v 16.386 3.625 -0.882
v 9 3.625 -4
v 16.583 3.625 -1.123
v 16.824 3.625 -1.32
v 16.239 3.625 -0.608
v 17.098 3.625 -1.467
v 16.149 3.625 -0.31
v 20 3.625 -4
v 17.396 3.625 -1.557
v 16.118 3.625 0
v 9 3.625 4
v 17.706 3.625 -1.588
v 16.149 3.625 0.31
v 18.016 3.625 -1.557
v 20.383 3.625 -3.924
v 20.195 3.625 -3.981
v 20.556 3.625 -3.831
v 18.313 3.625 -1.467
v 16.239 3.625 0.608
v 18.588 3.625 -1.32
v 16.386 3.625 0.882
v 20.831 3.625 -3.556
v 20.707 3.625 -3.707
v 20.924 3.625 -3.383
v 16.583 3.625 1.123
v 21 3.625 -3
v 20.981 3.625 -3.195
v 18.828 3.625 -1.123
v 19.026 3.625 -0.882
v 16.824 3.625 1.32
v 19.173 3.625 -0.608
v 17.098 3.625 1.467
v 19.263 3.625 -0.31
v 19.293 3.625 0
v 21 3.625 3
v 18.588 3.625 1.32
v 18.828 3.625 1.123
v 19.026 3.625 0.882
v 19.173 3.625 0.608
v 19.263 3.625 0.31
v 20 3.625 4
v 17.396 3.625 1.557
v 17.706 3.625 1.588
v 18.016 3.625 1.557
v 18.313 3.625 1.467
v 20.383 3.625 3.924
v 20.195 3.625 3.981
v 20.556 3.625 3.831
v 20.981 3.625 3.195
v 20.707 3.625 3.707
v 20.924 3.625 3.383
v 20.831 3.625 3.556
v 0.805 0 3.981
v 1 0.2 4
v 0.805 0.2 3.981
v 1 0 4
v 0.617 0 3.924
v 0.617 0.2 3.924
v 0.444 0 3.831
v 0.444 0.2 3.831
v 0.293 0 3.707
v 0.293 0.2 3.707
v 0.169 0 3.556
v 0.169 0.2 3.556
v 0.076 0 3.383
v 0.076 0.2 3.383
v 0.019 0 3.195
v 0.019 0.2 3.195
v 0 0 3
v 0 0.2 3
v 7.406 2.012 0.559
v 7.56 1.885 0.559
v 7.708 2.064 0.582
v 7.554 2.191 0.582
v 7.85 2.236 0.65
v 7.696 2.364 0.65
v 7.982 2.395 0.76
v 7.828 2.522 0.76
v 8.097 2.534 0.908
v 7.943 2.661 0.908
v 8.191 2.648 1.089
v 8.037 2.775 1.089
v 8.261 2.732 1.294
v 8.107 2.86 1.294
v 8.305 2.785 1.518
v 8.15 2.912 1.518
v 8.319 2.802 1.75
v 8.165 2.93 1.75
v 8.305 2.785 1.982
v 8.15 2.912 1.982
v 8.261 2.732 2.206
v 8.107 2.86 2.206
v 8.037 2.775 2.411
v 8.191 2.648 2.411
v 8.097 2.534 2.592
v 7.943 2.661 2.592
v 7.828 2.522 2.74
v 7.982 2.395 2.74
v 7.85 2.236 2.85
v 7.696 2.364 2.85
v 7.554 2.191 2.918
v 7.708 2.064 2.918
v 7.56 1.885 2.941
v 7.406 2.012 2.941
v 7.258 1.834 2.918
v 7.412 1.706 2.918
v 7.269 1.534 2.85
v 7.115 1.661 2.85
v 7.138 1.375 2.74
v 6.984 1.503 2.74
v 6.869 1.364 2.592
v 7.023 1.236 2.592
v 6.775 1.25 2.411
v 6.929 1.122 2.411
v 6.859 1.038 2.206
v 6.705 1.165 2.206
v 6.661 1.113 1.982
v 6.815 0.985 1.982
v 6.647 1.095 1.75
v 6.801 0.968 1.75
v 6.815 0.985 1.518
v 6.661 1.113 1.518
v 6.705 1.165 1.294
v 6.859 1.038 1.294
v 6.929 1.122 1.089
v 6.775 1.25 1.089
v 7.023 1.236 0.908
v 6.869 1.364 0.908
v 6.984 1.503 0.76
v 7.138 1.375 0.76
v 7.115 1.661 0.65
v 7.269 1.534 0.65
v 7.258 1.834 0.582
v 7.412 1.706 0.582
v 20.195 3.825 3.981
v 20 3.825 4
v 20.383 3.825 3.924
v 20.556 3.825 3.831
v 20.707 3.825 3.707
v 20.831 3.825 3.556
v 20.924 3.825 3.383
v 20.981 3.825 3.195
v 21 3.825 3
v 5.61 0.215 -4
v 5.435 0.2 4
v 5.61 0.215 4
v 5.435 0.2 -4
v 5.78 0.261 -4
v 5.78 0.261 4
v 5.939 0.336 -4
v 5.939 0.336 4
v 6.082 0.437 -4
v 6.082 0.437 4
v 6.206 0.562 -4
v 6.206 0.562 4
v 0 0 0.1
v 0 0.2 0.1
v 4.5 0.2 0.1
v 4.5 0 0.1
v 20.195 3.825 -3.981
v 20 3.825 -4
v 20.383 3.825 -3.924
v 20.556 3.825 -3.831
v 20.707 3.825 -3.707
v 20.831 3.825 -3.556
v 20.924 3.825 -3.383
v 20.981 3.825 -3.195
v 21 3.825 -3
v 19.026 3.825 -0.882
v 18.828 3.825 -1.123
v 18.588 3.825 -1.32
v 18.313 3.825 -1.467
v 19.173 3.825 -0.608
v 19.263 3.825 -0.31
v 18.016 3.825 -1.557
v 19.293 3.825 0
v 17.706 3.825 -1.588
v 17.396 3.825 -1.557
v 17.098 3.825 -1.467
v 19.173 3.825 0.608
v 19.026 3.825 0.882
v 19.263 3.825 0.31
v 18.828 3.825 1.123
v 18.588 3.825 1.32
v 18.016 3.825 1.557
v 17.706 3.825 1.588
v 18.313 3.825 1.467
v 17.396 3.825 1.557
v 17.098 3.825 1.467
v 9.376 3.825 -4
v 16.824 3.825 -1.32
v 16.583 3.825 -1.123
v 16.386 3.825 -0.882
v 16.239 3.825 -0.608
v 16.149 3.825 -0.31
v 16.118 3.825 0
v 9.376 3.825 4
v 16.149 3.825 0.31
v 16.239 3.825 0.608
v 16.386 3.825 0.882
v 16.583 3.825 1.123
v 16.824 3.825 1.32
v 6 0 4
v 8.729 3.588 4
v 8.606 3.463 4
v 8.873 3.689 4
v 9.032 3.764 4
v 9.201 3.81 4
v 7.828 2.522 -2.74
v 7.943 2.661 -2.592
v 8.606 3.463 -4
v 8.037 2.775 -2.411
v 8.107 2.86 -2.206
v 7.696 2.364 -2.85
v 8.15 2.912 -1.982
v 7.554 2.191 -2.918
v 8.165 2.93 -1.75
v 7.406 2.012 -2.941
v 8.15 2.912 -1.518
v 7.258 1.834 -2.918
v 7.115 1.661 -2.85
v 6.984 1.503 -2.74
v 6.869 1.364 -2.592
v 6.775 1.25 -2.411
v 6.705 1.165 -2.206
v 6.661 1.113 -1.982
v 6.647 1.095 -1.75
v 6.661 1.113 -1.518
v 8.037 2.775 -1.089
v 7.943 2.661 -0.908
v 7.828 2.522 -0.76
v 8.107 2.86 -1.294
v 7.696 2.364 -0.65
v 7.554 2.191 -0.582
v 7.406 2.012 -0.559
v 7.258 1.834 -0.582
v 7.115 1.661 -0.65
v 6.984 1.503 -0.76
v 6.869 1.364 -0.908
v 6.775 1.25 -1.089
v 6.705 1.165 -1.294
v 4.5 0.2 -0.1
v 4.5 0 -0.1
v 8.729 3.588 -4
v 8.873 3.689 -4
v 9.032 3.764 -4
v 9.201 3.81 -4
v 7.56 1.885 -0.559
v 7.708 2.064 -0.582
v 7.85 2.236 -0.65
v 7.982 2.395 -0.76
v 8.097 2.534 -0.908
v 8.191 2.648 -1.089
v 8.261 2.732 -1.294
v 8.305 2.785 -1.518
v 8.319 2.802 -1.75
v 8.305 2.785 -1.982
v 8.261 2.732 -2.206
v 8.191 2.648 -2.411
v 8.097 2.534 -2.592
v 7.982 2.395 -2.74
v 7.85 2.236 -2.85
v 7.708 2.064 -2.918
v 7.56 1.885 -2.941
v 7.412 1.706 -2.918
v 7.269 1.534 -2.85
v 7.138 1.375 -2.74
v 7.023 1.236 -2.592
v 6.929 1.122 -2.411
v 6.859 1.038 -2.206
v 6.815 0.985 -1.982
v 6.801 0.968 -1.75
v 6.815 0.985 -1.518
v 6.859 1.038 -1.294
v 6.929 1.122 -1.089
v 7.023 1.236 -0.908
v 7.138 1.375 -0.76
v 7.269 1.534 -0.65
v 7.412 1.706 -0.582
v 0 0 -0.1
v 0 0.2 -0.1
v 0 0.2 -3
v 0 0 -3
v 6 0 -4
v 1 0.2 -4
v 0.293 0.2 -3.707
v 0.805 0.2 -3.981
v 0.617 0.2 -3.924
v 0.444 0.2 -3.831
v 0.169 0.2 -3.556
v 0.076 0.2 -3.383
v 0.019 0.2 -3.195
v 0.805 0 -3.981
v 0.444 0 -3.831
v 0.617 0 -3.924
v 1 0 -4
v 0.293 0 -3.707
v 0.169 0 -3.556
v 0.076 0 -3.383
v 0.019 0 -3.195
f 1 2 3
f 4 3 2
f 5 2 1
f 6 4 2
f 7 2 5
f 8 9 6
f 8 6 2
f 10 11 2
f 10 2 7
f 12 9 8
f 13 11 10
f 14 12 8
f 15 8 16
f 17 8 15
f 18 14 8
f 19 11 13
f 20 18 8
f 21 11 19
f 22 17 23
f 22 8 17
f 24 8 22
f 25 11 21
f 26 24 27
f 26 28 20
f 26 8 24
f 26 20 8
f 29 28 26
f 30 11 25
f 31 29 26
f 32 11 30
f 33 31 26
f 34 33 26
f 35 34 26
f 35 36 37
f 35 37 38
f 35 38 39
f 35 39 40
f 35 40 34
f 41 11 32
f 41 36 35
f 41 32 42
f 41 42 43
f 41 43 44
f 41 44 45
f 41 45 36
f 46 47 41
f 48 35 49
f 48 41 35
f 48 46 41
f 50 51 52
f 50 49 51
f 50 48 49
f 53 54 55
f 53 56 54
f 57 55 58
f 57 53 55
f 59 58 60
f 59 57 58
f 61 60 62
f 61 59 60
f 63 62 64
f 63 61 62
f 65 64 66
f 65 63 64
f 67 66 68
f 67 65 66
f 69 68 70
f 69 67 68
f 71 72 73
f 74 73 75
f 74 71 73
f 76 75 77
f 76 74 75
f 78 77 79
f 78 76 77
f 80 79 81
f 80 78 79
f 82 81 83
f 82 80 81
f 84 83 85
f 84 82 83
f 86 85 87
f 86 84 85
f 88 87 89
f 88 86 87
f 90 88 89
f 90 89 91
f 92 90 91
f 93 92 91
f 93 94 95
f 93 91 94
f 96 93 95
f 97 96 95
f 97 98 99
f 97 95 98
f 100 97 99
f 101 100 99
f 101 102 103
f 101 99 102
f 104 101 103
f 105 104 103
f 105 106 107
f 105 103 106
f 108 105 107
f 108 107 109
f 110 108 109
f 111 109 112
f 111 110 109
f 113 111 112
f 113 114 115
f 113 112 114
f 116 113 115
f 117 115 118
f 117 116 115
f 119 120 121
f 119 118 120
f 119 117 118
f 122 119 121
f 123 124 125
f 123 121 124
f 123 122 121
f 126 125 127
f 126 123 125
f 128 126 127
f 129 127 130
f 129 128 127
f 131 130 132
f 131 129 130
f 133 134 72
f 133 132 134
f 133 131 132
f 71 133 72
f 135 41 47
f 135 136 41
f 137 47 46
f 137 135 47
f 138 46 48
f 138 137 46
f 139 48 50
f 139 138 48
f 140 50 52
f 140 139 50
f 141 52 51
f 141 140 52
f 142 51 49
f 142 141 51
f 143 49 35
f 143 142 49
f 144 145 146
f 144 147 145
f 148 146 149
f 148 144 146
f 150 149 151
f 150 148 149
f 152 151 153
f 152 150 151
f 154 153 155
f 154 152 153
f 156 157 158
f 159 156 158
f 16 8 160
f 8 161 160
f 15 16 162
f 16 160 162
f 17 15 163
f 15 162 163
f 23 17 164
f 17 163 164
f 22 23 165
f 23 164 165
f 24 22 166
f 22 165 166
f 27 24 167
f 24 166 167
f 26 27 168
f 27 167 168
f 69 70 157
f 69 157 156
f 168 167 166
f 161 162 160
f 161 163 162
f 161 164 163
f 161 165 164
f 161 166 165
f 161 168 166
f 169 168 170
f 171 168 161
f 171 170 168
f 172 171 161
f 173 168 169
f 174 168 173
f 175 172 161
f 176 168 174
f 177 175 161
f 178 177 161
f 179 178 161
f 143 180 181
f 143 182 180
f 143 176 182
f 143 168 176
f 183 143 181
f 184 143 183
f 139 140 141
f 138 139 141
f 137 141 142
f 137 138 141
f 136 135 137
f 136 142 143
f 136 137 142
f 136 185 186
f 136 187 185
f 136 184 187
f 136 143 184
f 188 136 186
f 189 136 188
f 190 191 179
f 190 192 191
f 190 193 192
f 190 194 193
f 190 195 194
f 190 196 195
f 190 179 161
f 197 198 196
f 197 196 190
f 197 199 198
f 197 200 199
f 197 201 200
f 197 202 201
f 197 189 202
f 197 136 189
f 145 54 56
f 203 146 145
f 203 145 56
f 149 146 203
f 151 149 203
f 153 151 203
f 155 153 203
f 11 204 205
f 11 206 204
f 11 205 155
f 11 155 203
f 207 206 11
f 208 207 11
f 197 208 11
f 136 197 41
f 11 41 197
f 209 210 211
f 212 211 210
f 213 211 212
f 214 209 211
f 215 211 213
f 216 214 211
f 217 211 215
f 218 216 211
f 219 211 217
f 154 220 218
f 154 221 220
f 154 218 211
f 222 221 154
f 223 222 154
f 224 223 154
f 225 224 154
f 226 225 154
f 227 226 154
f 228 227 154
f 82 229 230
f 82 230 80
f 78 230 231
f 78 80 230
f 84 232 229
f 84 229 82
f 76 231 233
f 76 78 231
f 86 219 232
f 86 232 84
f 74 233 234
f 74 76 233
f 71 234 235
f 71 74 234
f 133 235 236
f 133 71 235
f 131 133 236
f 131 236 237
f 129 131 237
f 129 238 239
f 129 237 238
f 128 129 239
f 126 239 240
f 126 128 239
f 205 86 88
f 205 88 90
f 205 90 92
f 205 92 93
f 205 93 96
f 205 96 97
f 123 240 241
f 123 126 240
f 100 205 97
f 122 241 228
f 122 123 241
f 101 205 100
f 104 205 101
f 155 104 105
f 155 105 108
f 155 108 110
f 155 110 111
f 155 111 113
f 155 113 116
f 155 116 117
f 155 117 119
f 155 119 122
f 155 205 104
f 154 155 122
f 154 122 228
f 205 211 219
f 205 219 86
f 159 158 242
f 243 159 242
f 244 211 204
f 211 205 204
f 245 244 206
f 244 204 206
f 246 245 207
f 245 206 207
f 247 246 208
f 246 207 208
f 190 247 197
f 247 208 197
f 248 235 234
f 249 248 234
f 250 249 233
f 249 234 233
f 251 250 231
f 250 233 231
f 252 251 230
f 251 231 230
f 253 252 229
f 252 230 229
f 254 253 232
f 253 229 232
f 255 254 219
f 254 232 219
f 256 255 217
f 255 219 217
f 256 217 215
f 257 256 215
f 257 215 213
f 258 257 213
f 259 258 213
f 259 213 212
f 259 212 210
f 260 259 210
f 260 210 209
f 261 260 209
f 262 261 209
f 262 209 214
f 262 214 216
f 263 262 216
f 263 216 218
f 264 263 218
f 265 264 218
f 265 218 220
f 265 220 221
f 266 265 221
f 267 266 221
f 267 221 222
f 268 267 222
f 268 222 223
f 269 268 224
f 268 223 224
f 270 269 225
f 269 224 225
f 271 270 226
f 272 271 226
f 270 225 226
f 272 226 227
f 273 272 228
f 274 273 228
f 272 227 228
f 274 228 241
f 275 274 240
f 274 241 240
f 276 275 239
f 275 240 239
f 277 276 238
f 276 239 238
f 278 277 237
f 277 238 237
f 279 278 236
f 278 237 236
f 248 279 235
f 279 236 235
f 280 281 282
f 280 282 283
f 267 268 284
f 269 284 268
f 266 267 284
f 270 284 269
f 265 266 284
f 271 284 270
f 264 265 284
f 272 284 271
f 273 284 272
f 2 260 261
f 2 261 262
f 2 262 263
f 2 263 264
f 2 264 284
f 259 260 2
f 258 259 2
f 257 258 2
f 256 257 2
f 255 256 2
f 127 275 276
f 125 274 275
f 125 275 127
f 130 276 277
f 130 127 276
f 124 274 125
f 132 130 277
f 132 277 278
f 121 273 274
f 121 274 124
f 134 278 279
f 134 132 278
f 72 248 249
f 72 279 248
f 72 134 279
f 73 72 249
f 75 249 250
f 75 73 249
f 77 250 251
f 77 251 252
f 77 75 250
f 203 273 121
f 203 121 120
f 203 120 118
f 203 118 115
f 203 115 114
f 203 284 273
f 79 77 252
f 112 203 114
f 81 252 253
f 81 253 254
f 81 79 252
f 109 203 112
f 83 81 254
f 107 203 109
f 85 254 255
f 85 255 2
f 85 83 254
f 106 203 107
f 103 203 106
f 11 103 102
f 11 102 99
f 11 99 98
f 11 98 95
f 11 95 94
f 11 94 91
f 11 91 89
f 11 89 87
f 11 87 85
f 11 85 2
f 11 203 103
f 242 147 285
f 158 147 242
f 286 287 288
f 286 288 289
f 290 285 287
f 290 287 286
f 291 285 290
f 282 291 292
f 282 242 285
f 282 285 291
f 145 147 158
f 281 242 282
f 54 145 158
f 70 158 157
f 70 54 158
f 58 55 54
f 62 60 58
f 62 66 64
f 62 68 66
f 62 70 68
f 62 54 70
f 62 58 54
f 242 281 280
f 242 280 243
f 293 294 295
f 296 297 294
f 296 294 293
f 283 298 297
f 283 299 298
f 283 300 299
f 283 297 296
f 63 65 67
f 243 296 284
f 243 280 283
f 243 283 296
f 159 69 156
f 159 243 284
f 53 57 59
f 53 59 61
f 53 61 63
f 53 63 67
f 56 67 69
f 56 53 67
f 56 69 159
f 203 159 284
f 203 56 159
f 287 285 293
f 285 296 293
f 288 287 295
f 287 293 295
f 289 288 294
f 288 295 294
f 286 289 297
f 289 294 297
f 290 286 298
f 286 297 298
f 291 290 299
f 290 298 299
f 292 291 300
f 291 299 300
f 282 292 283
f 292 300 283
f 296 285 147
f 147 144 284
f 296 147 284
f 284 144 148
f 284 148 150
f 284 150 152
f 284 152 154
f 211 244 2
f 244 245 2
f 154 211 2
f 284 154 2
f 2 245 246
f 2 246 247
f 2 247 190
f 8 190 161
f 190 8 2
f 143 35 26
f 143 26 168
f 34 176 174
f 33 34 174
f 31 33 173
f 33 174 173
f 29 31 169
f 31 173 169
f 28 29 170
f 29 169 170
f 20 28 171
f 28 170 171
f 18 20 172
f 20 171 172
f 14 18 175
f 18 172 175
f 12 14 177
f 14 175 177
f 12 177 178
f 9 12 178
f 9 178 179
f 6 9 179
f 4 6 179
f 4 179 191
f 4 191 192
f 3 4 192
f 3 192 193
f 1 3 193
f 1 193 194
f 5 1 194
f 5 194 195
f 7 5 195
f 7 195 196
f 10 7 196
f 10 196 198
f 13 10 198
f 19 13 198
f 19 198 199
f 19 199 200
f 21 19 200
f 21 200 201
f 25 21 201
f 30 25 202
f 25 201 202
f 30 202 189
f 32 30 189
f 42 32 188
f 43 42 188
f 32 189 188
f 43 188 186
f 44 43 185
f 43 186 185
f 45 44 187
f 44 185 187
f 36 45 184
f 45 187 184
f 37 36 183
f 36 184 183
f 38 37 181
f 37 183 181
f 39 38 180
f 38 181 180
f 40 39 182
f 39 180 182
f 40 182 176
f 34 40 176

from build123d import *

# Parameters (mm, degrees)
BOSS_EXTRUDE1_DEPTH = 4
SKETCH2_R           = 1.5875
CUT_EXTRUDE1_DEPTH  = 10
FILLET1_R           = 1
SKETCH3_W           = 4.5
SKETCH3_H           = 0.2
CUT_EXTRUDE2_DEPTH  = 10
FILLET2_R           = 1
SKETCH4_R           = 1.190625
CUT_EXTRUDE3_DEPTH  = 10


with BuildPart() as part:
    # Sketch1 → Boss-Extrude1 (new body, symmetric)
    with BuildSketch(Plane.XY):
        Polygon((0, 0), (6, 0), (9, 3.625), (21, 3.625), (21, 3.825), (8.905909928, 3.825), (5.905909928, 0.2), (0, 0.2), align=None)
    extrude(amount=BOSS_EXTRUDE1_DEPTH, both=True)

    # Sketch2 → Cut-Extrude1 (cut)
    with BuildSketch(Plane(origin=(0, 3.825, 0), x_dir=(1, 0, 0), z_dir=(0, 1, 0))):
        with Locations((17.705909928, 0)):
            Circle(SKETCH2_R)
    extrude(amount=-CUT_EXTRUDE1_DEPTH, mode=Mode.SUBTRACT)

    # Fillet1
    fillet1_edges = [part.edges().sort_by_distance(p)[0] for p in [
        (0, 0.1, -4),
        (21, 3.725, 4),
        (0, 0.1, 4),
        (21, 3.725, -4),
    ]]
    fillet(fillet1_edges, radius=FILLET1_R)

    # Sketch3 → Cut-Extrude2 (cut)
    with BuildSketch(Plane(origin=(0, 0.2, 0), x_dir=(1, 0, 0), z_dir=(0, 1, 0))):
        with Locations((2.25, 0)):
            Rectangle(SKETCH3_W, SKETCH3_H)
    extrude(amount=-CUT_EXTRUDE2_DEPTH, mode=Mode.SUBTRACT)

    # Fillet2
    fillet2_edges = [part.edges().sort_by_distance(p)[0] for p in [
        (5.905909928, 0.2, 0),
        (8.905909928, 3.825, 0),
    ]]
    fillet(fillet2_edges, radius=FILLET2_R)

    # Sketch4 → Cut-Extrude3 (cut)
    with BuildSketch(Plane(origin=(3.406965596, -2.819557735, 0), x_dir=(0, 0, 1), z_dir=(-0.770394321, 0.637567714, 0))):
        with Locations((-1.75, 6.272187634)):
            Circle(SKETCH4_R)
    cut_extrude3 = extrude(amount=-CUT_EXTRUDE3_DEPTH, mode=Mode.SUBTRACT)

    # Mirror1: Cut-Extrude3 across plane
    add(cut_extrude3.mirror(Plane.XY), mode=Mode.SUBTRACT)


solid = part.part
